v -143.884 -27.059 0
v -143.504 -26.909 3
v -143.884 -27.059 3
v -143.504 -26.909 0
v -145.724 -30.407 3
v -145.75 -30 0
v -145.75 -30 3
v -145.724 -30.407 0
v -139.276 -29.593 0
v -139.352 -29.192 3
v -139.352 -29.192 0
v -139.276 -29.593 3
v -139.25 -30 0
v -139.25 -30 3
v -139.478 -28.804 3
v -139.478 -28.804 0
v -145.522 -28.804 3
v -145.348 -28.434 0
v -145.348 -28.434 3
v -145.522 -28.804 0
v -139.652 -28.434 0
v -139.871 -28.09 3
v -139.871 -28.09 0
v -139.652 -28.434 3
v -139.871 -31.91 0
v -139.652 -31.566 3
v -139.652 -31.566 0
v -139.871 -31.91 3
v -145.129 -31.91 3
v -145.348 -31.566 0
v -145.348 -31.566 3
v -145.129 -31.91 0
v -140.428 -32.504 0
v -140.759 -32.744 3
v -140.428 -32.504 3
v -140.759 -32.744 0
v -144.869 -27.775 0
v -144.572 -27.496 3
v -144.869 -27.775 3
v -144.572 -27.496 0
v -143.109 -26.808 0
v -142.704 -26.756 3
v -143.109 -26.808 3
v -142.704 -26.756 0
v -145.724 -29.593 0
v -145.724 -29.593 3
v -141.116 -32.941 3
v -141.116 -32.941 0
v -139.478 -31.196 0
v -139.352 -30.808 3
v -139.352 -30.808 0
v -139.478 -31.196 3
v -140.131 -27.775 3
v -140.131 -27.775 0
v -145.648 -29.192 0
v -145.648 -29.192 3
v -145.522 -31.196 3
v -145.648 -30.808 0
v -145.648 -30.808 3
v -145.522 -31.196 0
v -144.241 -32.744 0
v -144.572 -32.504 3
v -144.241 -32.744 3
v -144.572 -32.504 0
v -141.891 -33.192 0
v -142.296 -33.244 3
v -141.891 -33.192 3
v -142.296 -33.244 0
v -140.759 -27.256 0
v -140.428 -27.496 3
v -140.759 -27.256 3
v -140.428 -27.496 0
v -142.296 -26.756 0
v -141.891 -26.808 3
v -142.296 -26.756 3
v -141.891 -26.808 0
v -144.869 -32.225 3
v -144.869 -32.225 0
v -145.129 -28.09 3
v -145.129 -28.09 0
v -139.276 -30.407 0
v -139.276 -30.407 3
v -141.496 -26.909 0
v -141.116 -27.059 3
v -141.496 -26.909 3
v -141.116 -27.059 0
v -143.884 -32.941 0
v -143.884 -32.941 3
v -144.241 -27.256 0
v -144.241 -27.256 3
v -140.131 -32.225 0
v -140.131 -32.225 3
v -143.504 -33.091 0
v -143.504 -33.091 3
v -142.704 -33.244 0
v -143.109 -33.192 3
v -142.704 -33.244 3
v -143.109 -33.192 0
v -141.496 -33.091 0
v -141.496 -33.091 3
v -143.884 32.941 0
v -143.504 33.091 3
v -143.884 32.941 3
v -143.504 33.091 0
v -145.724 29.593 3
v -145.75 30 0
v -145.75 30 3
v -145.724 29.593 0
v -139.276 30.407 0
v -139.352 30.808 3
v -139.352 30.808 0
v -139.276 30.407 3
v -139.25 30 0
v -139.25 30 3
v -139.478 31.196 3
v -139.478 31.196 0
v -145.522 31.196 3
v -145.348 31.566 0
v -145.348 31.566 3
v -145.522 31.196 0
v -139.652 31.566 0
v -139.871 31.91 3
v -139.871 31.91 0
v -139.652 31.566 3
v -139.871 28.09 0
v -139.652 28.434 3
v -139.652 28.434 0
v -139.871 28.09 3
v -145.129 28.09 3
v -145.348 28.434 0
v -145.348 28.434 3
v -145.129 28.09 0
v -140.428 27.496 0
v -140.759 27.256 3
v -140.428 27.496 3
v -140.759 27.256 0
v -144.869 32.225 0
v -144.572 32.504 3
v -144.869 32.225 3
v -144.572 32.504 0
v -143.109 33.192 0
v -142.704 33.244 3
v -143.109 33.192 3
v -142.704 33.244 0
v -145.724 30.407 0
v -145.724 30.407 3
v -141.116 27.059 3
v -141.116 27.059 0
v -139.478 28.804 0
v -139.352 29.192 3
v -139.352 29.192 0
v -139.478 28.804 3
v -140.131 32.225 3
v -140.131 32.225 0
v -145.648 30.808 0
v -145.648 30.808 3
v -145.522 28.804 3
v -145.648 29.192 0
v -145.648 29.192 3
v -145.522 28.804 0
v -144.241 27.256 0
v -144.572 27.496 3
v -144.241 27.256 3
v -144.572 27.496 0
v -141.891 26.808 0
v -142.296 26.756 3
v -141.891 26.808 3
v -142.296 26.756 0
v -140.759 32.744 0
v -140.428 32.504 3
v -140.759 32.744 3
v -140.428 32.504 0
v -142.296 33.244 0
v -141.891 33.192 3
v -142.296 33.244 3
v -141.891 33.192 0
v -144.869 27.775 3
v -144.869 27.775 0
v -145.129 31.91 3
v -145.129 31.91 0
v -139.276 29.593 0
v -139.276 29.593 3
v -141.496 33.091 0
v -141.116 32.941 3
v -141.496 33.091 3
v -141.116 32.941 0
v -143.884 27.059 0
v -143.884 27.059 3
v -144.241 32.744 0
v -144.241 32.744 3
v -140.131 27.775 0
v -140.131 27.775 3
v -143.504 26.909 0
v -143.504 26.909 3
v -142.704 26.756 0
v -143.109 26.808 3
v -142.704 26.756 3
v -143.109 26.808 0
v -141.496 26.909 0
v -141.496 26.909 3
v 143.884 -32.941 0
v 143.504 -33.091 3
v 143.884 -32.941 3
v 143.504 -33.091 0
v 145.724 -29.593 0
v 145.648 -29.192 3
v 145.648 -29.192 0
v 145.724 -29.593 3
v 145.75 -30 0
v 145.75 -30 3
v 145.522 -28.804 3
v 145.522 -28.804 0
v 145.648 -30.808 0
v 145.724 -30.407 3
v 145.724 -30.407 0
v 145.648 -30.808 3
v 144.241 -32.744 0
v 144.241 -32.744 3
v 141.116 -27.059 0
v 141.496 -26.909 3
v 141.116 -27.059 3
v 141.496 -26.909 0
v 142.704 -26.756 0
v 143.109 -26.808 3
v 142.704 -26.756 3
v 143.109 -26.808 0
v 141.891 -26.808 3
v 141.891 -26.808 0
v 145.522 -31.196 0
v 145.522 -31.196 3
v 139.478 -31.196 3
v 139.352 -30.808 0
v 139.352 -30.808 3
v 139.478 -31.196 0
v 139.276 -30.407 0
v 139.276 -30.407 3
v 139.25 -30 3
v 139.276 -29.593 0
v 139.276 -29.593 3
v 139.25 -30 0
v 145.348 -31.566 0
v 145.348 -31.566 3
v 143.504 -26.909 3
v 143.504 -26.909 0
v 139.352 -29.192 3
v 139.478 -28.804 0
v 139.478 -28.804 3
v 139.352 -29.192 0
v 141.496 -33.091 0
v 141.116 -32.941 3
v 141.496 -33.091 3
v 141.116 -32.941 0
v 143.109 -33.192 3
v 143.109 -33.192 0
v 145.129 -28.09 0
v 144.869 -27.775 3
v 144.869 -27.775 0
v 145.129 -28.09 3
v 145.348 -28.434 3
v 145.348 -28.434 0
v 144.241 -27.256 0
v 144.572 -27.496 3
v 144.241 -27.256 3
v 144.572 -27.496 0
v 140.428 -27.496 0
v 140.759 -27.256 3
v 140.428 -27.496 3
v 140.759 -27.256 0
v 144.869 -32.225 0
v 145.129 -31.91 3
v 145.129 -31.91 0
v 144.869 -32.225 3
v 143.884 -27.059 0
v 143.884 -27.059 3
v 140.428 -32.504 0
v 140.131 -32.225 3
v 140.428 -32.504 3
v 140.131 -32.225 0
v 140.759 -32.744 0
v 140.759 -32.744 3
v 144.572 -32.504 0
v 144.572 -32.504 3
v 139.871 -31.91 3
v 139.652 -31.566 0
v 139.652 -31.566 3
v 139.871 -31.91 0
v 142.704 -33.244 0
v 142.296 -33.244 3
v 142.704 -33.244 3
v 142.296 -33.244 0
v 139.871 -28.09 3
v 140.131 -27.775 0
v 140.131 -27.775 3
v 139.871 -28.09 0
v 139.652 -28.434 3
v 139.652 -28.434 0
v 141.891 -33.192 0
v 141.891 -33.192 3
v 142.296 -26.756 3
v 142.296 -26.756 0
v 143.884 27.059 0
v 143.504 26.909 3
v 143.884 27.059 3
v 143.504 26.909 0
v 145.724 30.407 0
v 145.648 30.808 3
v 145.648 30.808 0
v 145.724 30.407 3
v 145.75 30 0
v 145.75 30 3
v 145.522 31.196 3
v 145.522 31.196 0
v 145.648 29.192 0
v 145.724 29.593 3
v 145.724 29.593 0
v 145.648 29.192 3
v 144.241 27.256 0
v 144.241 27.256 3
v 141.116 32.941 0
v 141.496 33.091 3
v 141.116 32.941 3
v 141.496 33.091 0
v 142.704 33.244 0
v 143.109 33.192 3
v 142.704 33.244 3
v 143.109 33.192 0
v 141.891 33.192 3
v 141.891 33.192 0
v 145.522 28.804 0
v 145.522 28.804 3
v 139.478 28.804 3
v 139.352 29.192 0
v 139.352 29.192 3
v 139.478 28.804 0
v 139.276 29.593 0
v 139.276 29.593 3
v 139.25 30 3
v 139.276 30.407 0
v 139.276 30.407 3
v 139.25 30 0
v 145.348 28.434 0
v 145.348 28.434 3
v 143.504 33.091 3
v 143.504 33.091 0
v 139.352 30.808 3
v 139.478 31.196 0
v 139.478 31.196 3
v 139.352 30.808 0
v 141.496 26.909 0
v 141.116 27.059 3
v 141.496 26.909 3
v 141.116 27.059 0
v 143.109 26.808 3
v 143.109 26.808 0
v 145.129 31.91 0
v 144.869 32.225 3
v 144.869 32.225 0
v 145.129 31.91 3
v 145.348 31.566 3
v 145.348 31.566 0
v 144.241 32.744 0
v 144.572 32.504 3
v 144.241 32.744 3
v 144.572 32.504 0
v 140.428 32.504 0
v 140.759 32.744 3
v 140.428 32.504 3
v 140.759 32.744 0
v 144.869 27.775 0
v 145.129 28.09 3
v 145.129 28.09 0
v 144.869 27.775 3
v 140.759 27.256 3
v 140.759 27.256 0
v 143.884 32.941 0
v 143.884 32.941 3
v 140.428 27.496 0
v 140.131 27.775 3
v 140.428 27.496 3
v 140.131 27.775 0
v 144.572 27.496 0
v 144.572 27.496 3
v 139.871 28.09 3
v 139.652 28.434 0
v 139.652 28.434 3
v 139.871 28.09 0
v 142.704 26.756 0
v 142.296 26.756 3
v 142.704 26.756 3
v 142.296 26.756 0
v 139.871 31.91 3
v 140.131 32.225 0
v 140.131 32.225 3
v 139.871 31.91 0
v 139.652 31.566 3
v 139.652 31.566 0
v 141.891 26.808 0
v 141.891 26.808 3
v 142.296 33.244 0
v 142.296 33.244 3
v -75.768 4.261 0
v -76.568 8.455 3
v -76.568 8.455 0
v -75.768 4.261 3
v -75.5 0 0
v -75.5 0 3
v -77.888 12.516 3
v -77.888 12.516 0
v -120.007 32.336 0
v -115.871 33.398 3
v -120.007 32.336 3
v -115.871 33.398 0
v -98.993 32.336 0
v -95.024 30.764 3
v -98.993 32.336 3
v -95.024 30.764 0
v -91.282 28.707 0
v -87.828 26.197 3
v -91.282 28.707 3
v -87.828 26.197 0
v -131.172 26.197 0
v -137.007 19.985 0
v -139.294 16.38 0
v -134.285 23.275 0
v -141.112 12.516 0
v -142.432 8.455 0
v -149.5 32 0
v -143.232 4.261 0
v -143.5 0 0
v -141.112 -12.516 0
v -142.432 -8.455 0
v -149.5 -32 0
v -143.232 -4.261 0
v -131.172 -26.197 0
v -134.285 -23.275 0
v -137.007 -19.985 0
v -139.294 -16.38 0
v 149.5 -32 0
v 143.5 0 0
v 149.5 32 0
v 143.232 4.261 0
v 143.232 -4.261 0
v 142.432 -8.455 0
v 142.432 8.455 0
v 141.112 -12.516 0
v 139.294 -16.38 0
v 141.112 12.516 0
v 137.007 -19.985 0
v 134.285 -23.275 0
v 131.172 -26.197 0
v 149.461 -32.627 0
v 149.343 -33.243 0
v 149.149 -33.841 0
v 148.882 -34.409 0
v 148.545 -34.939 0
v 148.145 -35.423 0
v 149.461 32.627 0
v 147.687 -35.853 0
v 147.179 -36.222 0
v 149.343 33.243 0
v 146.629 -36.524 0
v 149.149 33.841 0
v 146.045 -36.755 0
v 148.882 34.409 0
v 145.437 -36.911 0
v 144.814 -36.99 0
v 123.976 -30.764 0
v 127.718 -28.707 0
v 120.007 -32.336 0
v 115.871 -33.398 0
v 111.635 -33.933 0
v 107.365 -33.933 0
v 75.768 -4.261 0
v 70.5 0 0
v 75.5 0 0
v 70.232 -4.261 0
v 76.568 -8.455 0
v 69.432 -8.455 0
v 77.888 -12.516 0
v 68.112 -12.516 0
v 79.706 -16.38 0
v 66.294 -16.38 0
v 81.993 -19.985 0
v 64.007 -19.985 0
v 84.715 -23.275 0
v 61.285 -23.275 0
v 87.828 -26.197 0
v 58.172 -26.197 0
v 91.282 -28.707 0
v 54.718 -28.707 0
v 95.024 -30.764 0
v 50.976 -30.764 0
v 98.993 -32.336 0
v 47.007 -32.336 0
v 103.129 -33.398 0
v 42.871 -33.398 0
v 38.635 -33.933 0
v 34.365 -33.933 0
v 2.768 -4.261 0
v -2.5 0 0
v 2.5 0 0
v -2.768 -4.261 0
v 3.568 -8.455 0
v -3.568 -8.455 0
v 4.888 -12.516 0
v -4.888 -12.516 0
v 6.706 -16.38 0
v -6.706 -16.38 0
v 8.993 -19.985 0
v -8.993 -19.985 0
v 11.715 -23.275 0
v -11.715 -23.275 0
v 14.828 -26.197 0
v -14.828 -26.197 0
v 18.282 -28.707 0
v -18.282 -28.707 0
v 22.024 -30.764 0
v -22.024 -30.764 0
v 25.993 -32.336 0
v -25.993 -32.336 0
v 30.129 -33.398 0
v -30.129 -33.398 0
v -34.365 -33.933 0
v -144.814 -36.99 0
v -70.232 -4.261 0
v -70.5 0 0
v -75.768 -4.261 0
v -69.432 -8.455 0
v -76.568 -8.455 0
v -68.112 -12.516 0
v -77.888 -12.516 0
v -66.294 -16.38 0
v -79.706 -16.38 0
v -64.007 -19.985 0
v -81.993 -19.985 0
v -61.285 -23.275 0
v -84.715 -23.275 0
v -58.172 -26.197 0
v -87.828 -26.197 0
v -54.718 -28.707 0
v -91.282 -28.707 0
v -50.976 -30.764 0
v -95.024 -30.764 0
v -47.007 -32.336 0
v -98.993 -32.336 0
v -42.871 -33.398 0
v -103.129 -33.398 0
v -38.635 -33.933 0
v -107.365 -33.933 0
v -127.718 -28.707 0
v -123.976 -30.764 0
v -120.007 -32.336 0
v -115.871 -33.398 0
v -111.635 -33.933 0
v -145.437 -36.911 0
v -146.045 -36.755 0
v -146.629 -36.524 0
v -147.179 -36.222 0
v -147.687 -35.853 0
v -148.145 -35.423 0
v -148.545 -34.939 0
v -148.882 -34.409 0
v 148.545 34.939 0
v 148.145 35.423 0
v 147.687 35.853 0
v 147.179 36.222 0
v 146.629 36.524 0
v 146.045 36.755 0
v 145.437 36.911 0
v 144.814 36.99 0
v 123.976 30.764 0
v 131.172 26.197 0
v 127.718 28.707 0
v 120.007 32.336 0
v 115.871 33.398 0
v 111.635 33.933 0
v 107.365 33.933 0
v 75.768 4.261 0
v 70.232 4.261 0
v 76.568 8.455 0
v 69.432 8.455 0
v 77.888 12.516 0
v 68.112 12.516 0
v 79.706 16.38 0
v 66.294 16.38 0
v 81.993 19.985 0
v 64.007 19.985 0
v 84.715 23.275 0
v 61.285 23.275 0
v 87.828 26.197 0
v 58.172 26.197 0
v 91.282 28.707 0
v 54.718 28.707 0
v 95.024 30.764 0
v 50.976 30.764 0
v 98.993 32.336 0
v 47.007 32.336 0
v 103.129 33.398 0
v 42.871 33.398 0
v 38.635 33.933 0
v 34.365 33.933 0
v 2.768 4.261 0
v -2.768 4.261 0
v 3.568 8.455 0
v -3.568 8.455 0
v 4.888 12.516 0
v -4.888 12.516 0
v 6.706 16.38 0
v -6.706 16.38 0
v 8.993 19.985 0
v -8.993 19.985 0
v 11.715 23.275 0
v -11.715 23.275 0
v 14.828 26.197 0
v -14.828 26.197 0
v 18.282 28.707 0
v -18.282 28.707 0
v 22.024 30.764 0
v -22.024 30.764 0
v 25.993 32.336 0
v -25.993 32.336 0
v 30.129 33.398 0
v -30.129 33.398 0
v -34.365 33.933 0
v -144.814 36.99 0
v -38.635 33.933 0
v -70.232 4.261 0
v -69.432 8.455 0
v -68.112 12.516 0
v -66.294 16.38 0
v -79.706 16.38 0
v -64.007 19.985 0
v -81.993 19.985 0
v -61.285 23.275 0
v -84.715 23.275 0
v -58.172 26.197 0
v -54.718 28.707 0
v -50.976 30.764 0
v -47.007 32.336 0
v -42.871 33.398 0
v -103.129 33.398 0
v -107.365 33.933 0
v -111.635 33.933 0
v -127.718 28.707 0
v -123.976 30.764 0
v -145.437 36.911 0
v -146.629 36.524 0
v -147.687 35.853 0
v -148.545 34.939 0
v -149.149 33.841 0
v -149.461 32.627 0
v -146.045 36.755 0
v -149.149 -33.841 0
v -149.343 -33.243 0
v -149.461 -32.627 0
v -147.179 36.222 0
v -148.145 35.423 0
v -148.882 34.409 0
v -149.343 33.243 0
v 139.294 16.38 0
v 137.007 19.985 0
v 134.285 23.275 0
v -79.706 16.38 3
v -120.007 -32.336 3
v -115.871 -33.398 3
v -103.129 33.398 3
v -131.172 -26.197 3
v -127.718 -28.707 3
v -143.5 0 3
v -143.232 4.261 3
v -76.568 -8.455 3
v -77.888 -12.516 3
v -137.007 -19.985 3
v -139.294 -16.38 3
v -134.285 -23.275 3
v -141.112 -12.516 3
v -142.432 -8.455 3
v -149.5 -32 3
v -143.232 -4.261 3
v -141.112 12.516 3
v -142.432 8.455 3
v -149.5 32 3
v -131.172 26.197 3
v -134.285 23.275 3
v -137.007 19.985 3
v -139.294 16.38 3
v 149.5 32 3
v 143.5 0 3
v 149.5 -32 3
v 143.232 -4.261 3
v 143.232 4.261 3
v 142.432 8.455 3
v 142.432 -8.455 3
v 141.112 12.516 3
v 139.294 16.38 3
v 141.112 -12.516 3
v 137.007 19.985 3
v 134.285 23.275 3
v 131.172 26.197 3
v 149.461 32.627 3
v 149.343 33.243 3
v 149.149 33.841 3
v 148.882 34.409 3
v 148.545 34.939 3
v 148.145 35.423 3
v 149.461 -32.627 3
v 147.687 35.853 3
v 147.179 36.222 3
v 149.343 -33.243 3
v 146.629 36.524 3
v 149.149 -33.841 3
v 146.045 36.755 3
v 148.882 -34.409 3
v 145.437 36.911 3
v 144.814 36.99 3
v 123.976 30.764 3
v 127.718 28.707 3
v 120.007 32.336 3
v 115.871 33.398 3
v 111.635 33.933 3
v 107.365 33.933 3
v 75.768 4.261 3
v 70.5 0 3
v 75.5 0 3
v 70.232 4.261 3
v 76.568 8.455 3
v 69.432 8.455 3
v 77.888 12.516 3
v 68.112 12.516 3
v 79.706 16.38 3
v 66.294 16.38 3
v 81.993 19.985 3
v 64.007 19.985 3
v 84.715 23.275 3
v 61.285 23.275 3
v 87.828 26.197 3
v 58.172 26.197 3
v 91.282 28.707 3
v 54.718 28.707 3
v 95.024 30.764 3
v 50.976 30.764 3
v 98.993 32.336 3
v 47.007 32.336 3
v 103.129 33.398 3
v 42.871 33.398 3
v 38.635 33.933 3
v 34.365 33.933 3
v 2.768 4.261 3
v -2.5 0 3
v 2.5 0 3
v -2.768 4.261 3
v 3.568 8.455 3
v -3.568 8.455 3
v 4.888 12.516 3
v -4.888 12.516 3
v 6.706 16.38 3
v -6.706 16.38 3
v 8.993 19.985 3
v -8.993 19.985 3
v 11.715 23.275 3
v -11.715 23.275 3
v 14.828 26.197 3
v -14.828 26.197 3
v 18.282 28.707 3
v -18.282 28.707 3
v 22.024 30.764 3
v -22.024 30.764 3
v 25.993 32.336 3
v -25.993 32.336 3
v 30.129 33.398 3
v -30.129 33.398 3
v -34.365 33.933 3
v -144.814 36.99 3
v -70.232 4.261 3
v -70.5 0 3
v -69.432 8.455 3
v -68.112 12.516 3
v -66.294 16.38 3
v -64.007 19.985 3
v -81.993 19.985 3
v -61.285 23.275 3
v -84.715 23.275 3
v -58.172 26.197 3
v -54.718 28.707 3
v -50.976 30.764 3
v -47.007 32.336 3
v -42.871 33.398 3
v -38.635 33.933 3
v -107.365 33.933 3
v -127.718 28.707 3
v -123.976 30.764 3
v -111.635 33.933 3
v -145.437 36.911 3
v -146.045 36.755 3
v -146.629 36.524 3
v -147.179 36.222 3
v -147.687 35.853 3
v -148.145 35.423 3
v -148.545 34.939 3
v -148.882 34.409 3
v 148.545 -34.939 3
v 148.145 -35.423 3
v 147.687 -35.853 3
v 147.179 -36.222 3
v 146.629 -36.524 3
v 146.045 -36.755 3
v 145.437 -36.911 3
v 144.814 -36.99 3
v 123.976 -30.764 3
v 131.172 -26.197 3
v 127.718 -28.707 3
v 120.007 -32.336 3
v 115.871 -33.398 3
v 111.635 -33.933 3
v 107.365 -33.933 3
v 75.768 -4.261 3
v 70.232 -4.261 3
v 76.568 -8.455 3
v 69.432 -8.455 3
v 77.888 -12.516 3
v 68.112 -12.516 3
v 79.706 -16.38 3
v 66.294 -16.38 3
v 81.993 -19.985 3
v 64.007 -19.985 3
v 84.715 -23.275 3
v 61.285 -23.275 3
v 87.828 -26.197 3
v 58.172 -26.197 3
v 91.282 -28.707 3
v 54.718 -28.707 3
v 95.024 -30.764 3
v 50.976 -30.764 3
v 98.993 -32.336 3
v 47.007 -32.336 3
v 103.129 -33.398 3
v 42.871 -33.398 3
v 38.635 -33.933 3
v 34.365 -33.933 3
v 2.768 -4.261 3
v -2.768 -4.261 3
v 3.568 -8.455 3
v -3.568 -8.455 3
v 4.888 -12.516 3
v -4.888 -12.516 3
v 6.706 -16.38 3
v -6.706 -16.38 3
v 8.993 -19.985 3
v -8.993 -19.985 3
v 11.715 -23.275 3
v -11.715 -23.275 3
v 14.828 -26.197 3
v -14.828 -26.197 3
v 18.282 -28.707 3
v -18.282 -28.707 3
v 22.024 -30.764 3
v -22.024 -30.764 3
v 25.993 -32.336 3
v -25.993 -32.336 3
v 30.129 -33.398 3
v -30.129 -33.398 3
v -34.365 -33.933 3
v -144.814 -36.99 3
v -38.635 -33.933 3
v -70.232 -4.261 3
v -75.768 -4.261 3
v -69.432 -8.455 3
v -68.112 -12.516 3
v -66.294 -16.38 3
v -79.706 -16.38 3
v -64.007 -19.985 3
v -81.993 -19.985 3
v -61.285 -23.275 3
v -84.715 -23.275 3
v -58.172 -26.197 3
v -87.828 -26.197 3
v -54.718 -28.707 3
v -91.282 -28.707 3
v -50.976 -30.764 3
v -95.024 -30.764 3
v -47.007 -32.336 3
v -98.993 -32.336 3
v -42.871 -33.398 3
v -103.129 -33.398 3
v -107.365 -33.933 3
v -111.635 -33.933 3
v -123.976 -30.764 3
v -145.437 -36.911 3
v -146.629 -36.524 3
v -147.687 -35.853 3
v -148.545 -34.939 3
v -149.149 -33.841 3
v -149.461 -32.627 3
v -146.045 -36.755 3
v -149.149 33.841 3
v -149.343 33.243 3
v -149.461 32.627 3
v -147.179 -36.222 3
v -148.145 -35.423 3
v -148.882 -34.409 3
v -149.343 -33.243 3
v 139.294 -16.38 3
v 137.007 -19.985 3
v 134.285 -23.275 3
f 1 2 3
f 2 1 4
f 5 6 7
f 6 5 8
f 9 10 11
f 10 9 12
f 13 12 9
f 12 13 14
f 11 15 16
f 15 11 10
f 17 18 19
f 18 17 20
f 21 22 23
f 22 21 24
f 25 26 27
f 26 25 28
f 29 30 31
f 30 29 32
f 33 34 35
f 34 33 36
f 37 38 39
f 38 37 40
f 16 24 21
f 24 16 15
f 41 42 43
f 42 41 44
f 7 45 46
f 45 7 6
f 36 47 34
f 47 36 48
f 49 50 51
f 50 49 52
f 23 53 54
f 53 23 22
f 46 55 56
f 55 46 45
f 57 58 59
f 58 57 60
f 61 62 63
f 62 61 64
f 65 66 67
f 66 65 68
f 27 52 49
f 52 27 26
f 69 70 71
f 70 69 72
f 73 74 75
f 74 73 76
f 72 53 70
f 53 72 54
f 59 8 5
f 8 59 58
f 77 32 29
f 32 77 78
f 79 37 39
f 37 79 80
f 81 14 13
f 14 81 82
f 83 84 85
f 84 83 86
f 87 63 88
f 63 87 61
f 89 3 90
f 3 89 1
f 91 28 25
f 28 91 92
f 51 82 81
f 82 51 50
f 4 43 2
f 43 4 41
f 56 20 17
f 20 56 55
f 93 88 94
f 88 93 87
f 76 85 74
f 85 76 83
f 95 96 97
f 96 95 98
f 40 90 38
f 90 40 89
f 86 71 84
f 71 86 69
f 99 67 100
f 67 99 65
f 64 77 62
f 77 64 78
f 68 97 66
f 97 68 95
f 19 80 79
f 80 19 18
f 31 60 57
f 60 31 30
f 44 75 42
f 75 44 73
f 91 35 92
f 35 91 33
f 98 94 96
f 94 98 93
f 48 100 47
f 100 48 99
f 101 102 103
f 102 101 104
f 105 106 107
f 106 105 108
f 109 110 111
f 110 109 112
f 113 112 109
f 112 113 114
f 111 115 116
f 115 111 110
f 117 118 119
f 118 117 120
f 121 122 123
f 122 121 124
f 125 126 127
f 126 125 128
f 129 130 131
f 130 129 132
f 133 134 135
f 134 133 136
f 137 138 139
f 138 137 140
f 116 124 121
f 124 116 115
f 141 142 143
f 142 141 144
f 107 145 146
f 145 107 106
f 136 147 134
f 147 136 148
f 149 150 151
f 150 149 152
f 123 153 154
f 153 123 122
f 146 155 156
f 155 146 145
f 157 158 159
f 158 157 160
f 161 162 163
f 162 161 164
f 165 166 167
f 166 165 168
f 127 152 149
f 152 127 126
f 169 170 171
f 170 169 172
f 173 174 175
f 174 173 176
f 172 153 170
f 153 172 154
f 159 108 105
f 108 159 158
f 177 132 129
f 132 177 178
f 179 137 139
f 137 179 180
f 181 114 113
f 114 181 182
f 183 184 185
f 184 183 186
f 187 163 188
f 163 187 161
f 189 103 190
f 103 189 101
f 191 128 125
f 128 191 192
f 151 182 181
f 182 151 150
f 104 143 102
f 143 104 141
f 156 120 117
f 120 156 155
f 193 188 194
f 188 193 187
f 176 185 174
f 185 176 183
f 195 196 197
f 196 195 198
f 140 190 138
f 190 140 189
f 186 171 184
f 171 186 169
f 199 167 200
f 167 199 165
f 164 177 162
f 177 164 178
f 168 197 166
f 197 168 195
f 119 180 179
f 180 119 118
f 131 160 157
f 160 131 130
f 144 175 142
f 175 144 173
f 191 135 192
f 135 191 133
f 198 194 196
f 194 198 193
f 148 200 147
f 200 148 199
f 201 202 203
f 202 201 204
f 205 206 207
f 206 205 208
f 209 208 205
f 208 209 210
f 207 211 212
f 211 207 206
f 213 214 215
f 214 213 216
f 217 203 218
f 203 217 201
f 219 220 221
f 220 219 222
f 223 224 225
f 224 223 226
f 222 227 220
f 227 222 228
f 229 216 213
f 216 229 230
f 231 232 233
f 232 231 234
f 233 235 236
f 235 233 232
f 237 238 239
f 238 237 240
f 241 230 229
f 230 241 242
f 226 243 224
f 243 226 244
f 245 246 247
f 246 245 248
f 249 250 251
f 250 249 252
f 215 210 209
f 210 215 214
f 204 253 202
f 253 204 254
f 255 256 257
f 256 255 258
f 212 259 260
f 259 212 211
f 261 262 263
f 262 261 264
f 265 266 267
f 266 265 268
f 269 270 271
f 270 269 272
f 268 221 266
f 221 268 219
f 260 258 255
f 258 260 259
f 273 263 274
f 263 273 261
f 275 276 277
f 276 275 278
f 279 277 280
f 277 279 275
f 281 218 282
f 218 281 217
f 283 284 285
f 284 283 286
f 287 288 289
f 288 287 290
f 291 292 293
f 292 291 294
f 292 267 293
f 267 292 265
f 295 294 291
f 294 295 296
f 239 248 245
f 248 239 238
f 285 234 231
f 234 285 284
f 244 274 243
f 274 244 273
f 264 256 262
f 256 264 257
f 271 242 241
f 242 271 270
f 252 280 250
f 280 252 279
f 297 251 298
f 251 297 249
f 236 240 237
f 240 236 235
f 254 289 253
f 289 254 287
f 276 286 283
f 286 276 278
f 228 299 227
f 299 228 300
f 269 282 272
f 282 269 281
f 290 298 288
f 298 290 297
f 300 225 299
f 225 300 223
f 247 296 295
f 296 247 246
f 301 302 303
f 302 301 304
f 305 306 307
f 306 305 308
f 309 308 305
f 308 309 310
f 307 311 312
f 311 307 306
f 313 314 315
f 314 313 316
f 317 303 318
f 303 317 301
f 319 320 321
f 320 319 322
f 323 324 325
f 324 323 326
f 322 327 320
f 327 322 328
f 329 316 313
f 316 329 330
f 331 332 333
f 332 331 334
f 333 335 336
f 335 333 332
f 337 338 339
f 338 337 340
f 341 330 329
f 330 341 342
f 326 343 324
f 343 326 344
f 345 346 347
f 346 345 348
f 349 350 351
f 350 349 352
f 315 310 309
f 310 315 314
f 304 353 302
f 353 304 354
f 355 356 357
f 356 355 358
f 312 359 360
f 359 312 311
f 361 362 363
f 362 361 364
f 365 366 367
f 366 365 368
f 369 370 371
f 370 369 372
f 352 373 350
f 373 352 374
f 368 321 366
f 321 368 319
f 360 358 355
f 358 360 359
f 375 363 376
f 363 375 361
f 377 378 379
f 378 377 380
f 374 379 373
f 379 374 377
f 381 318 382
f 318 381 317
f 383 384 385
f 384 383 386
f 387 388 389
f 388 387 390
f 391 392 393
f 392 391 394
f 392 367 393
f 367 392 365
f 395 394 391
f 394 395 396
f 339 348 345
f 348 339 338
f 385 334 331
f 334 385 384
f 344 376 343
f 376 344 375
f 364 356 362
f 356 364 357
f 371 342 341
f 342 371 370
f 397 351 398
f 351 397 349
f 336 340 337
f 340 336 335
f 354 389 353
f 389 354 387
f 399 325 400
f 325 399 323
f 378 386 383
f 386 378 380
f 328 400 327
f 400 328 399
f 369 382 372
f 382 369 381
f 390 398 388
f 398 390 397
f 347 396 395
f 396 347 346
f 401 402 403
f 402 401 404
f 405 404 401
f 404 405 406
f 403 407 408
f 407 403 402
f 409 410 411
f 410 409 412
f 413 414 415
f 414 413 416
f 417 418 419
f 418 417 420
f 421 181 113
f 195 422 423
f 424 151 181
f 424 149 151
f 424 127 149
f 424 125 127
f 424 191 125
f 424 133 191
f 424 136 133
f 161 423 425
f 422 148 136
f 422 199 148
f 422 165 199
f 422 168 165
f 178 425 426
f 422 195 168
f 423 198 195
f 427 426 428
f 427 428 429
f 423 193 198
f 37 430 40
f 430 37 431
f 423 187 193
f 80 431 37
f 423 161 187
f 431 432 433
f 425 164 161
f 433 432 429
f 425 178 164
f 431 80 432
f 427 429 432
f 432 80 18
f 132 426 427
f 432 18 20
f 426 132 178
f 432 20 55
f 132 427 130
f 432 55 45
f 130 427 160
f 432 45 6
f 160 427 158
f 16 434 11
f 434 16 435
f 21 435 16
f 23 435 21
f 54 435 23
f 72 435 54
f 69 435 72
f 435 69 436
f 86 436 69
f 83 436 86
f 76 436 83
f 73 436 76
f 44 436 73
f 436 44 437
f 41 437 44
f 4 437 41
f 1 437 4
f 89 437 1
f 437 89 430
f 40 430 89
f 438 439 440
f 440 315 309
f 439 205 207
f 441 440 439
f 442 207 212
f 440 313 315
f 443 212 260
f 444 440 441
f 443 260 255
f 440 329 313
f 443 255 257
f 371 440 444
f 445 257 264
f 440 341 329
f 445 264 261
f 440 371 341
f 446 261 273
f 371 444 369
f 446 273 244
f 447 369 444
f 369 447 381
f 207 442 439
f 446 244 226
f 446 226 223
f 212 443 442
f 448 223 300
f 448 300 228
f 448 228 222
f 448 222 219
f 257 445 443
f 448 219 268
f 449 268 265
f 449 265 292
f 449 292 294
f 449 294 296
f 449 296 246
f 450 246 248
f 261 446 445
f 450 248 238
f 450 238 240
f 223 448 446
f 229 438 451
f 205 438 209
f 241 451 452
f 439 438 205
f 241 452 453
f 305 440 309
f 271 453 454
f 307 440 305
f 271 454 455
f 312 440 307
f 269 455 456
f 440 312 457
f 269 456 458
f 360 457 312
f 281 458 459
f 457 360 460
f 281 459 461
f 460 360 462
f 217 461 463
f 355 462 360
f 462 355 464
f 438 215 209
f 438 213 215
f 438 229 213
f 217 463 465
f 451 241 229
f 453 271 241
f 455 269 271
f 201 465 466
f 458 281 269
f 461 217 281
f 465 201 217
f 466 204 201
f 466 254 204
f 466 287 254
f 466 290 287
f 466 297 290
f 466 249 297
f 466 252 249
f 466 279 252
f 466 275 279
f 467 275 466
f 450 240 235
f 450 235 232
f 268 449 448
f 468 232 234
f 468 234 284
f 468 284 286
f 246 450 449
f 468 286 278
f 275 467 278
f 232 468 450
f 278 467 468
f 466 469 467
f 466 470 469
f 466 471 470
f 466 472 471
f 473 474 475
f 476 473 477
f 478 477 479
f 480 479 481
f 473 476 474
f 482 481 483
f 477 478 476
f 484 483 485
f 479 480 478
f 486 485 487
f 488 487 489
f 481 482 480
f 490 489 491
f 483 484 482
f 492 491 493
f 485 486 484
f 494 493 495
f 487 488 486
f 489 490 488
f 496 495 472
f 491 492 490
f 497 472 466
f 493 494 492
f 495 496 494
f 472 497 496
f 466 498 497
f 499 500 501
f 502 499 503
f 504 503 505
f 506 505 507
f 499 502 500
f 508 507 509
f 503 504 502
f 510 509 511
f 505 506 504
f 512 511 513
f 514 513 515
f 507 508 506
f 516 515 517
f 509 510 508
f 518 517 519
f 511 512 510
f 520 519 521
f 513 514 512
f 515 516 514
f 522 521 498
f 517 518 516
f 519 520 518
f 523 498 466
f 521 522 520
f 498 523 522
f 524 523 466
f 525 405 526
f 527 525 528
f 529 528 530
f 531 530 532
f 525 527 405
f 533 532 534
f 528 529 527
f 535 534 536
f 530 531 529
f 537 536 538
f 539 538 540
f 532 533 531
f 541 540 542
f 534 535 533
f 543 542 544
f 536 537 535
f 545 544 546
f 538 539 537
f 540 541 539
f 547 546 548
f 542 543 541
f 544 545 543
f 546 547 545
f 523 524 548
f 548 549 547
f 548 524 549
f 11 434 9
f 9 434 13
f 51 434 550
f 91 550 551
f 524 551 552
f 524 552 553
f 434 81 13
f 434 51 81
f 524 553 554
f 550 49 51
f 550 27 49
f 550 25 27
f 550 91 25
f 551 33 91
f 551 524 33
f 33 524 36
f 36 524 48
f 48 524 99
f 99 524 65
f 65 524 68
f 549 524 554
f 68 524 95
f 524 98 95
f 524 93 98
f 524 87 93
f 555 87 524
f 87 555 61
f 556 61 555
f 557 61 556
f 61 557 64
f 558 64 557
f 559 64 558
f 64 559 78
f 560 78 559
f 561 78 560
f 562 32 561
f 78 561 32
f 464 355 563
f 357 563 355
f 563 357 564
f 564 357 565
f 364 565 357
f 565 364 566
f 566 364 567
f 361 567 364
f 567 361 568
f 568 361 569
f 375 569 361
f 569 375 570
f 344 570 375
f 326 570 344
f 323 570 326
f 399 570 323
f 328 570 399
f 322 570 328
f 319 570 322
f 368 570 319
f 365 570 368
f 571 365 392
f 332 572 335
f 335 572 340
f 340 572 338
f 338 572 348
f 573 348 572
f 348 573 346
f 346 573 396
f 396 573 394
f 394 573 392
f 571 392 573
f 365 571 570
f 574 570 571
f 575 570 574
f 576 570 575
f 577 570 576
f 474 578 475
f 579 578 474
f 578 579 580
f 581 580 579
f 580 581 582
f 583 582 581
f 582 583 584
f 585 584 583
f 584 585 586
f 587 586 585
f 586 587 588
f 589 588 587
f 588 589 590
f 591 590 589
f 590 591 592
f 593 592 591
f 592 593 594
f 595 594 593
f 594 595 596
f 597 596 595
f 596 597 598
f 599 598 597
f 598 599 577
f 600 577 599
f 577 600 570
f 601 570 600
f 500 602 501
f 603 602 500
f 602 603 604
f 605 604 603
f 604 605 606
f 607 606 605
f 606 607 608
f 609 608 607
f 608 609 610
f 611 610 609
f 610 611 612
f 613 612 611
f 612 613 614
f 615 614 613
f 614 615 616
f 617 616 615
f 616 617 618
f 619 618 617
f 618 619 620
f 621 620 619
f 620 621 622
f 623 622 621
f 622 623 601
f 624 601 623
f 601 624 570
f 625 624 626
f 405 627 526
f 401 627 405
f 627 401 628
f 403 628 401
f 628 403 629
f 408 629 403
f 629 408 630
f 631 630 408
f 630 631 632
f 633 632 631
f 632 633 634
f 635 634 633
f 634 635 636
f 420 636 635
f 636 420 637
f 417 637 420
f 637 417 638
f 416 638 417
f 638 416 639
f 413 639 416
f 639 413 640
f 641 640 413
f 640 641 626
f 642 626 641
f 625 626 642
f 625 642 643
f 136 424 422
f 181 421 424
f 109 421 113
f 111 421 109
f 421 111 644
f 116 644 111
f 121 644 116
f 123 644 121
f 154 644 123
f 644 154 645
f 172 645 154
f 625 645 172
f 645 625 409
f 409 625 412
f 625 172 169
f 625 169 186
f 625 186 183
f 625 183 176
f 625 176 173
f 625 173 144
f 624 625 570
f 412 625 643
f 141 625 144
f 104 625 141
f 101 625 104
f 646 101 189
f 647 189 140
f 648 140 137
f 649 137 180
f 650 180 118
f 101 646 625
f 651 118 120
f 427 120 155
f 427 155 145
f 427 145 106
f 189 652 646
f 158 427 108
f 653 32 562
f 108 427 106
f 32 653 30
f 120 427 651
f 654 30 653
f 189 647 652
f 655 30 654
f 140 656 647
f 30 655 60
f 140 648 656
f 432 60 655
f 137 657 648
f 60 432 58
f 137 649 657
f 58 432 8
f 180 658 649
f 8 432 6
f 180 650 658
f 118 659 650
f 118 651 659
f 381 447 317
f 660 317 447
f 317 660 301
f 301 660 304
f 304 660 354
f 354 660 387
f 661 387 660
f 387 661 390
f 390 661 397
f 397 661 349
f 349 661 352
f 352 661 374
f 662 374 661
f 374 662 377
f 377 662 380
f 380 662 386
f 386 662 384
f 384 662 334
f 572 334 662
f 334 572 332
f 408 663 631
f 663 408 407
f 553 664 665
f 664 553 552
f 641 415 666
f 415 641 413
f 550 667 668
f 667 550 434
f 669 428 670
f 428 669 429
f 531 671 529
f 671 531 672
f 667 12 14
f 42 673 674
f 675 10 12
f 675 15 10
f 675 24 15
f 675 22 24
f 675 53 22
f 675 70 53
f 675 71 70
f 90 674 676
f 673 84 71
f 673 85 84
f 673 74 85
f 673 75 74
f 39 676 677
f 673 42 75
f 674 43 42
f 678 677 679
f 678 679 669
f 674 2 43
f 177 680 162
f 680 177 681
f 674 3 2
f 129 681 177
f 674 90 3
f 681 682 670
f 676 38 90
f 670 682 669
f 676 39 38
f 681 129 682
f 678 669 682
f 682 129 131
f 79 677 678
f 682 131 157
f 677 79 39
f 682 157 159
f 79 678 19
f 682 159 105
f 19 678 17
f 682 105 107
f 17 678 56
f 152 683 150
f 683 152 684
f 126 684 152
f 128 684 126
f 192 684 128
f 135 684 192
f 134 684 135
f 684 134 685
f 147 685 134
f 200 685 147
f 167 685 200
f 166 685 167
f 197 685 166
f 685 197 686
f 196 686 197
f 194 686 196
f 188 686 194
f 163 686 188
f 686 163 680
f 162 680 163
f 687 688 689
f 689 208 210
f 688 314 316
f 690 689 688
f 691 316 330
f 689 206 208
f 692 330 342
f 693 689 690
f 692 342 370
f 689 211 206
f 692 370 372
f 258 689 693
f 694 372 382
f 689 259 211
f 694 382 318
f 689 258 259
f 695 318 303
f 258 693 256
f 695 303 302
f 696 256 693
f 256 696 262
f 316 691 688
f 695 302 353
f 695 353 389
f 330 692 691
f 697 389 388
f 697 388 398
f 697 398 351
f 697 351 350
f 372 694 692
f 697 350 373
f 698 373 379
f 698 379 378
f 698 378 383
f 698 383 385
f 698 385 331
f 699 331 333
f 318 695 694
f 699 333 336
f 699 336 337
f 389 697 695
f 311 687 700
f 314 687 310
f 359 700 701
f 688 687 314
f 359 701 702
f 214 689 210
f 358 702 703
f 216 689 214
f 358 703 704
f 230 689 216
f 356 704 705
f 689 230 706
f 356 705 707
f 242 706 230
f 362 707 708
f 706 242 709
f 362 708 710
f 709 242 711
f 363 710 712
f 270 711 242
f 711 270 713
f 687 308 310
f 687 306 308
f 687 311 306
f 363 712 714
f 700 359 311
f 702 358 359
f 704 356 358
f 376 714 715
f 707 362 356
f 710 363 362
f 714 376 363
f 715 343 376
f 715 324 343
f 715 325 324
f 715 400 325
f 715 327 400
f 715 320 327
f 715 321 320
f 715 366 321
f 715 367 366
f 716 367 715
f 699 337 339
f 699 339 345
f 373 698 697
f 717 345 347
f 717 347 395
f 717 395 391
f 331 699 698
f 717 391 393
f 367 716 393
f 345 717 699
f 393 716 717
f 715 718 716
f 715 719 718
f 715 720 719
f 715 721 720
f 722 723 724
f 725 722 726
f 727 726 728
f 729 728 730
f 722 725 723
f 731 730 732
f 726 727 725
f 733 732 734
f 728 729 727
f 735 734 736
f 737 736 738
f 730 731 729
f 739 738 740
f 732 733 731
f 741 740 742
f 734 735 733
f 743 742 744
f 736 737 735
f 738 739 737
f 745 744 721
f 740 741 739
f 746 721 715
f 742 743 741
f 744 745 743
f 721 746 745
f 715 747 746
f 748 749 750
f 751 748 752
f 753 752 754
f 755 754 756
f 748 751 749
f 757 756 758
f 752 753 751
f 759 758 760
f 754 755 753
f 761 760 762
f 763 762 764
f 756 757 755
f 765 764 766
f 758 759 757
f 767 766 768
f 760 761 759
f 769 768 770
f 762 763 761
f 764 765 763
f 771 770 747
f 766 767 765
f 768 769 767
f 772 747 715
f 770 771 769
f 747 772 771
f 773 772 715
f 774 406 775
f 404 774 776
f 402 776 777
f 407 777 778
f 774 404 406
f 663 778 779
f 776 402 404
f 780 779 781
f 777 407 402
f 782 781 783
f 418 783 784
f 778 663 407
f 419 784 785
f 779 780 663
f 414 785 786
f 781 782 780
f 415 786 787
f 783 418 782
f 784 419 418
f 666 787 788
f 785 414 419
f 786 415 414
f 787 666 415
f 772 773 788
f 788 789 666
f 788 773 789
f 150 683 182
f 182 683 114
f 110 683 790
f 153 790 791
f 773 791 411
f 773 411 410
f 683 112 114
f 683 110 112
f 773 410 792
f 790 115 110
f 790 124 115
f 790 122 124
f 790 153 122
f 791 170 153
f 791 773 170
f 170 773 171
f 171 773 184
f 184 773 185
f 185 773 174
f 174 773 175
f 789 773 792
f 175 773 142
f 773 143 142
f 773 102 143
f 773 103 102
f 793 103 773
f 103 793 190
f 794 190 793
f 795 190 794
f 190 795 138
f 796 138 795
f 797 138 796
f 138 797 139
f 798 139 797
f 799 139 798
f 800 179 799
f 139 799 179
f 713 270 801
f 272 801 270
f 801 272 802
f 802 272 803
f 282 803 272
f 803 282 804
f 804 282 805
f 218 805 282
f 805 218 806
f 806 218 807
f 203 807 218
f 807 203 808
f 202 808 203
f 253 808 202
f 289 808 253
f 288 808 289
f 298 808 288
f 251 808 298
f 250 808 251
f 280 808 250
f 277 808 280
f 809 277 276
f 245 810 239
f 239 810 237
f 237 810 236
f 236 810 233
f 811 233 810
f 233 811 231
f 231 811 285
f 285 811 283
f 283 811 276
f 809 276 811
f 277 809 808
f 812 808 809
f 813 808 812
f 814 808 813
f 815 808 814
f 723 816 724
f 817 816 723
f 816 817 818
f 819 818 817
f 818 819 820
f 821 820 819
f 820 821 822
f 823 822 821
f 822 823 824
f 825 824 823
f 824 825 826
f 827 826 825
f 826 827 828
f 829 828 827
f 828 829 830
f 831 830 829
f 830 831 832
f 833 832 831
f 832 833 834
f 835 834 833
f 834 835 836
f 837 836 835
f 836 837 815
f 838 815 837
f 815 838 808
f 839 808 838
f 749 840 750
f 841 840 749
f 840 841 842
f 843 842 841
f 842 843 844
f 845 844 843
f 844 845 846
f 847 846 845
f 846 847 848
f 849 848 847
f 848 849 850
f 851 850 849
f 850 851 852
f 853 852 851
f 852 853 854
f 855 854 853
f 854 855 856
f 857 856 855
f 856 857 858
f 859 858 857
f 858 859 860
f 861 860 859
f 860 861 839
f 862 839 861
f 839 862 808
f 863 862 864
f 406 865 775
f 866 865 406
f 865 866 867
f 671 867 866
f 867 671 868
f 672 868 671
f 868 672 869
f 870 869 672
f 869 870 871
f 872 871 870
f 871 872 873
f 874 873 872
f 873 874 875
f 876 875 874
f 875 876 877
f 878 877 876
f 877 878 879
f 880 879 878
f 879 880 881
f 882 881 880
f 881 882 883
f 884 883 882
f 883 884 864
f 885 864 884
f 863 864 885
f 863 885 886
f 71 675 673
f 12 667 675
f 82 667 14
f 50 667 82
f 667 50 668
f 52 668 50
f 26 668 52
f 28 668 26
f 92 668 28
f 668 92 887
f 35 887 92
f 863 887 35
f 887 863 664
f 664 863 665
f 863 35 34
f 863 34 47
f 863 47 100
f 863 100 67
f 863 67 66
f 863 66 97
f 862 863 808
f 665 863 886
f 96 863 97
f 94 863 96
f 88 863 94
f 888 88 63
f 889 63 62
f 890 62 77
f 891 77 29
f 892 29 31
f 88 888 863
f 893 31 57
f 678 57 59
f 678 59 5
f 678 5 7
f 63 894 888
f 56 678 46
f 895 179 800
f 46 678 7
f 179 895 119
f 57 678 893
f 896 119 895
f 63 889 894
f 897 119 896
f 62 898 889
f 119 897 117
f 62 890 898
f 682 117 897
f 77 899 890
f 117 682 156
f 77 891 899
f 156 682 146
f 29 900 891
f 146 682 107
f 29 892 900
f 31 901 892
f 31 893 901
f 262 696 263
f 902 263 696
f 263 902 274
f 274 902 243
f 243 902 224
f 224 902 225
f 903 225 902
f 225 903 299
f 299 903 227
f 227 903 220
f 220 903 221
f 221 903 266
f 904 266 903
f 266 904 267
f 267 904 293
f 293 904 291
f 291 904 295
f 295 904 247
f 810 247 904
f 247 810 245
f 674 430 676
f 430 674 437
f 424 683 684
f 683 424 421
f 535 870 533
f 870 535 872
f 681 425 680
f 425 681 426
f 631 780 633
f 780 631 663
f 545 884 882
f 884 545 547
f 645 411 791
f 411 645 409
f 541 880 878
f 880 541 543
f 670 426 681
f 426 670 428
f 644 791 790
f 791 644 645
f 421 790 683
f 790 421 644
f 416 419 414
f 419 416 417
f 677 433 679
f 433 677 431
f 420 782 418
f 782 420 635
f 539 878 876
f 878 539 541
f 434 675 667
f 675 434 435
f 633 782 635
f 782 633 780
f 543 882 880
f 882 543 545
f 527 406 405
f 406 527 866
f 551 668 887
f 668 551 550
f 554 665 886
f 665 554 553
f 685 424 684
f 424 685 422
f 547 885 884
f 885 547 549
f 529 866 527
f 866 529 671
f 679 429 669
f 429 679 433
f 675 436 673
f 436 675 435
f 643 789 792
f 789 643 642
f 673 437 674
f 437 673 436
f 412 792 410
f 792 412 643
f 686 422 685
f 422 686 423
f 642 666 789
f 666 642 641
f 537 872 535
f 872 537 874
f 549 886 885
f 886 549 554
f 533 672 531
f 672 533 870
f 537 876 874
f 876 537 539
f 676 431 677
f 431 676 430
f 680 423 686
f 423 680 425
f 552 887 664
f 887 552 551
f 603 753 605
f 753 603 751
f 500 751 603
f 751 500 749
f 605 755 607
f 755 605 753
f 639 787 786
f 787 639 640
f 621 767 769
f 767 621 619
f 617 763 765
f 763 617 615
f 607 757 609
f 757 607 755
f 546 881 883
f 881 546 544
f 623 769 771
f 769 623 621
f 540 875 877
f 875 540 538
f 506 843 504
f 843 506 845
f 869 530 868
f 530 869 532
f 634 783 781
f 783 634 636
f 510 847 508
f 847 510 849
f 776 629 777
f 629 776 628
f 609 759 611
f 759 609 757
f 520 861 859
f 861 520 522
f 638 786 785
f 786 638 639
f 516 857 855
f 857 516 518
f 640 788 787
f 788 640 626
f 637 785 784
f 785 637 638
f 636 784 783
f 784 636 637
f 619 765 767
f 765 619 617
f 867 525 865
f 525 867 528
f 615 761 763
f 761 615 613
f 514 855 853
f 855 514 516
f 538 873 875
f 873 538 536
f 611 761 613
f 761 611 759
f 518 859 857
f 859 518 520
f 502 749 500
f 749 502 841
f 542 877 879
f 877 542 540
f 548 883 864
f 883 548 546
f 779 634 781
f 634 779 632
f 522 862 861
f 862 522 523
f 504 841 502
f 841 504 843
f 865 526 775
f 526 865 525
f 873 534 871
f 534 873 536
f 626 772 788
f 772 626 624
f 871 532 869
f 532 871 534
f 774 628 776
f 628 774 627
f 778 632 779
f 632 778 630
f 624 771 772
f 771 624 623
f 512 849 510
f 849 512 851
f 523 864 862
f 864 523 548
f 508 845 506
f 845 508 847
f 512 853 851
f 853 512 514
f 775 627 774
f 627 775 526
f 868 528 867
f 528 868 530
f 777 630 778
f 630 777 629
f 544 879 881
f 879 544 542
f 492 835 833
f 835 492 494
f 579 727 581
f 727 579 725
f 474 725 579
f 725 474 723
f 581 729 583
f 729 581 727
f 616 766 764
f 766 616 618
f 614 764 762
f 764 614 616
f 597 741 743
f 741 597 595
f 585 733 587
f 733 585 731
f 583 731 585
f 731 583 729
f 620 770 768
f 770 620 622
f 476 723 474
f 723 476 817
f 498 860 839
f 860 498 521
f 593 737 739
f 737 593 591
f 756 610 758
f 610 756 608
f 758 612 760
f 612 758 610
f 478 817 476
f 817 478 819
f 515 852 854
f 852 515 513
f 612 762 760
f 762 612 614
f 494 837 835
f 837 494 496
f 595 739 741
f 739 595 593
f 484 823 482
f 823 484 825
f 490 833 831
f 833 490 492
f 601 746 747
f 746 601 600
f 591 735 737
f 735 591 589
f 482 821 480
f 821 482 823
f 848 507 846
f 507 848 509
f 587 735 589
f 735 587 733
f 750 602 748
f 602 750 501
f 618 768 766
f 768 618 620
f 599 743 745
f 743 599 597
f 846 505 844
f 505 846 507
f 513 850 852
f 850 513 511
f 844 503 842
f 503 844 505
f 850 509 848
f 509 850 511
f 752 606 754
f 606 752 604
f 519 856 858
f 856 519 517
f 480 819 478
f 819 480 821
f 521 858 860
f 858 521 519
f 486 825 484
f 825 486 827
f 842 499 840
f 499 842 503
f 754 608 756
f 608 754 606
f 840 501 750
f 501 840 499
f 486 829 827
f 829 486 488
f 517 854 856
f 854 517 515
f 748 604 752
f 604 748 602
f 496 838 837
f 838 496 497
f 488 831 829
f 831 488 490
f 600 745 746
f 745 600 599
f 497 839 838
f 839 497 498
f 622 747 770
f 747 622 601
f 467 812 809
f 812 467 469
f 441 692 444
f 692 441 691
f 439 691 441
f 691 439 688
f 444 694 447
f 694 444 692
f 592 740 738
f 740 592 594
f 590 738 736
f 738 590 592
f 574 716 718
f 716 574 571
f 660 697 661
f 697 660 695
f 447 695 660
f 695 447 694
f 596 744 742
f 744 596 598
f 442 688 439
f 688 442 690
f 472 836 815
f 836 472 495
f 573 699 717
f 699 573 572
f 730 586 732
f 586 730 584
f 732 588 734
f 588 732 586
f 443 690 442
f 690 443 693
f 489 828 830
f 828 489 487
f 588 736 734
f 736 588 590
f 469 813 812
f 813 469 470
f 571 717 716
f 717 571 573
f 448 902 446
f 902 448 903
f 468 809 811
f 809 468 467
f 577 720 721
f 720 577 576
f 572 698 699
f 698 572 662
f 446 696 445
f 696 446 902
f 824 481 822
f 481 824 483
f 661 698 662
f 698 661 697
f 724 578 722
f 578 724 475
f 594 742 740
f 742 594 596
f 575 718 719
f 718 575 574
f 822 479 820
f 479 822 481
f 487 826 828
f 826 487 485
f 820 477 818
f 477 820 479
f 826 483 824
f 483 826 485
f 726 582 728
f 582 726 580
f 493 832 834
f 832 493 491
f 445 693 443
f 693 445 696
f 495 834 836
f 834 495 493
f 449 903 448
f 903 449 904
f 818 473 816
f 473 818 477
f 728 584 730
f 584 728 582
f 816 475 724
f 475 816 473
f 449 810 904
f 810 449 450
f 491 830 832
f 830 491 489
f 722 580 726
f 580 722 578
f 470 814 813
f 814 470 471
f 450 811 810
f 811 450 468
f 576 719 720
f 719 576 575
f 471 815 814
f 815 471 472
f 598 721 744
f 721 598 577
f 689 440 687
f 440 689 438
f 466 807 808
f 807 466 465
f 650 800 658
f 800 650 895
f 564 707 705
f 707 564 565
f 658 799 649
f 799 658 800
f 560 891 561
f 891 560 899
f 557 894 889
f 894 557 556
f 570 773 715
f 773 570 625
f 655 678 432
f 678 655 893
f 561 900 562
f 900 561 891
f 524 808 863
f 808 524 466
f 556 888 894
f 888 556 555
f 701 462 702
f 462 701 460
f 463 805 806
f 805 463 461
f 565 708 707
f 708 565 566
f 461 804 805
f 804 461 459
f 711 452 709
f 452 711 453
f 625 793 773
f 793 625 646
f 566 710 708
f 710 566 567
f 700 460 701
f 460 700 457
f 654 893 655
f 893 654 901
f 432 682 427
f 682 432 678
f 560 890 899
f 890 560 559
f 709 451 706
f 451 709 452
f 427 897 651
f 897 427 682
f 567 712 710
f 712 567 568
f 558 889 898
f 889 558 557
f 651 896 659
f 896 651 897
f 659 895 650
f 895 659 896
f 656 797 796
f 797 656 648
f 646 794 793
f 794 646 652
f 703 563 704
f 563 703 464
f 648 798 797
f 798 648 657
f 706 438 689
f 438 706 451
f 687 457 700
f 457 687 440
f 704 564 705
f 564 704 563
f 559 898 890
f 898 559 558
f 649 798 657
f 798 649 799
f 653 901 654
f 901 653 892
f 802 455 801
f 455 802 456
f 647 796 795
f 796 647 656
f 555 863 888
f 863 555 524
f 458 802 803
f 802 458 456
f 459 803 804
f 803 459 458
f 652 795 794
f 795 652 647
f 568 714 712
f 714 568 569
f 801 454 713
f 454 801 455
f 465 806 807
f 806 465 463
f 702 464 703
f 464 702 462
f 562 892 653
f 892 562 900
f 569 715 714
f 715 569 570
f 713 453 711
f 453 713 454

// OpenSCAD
$fn = 50;

difference() {
	union() {
		hull() {
			translate(v = [-144.5, 32.0, 0]) {
				cylinder(h = 3, r = 5);
			}
			translate(v = [144.5, 32.0, 0]) {
				cylinder(h = 3, r = 5);
			}
			translate(v = [-144.5, -32.0, 0]) {
				cylinder(h = 3, r = 5);
			}
			translate(v = [144.5, -32.0, 0]) {
				cylinder(h = 3, r = 5);
			}
		}
	}
	union() {
		translate(v = [-142.5, -30.0, -100.0]) {
			cylinder(h = 200, r = 3.25);
		}
		translate(v = [-142.5, 30.0, -100.0]) {
			cylinder(h = 200, r = 3.25);
		}
		translate(v = [142.5, -30.0, -100.0]) {
			cylinder(h = 200, r = 3.25);
		}
		translate(v = [142.5, 30.0, -100.0]) {
			cylinder(h = 200, r = 3.25);
		}
		translate(v = [-142.5, -30.0, -100.0]) {
			cylinder(h = 200, r = 1.8);
		}
		translate(v = [-142.5, 30.0, -100.0]) {
			cylinder(h = 200, r = 1.8);
		}
		translate(v = [142.5, -30.0, -100.0]) {
			cylinder(h = 200, r = 1.8);
		}
		translate(v = [142.5, 30.0, -100.0]) {
			cylinder(h = 200, r = 1.8);
		}
		translate(v = [-109.5, 0, 0.0]) {
			cylinder(h = 3, r = 34.0);
		}
		translate(v = [-36.5, 0, 0.0]) {
			cylinder(h = 3, r = 34.0);
		}
		translate(v = [36.5, 0, 0.0]) {
			cylinder(h = 3, r = 34.0);
		}
		translate(v = [109.5, 0, 0.0]) {
			cylinder(h = 3, r = 34.0);
		}
	}
}
